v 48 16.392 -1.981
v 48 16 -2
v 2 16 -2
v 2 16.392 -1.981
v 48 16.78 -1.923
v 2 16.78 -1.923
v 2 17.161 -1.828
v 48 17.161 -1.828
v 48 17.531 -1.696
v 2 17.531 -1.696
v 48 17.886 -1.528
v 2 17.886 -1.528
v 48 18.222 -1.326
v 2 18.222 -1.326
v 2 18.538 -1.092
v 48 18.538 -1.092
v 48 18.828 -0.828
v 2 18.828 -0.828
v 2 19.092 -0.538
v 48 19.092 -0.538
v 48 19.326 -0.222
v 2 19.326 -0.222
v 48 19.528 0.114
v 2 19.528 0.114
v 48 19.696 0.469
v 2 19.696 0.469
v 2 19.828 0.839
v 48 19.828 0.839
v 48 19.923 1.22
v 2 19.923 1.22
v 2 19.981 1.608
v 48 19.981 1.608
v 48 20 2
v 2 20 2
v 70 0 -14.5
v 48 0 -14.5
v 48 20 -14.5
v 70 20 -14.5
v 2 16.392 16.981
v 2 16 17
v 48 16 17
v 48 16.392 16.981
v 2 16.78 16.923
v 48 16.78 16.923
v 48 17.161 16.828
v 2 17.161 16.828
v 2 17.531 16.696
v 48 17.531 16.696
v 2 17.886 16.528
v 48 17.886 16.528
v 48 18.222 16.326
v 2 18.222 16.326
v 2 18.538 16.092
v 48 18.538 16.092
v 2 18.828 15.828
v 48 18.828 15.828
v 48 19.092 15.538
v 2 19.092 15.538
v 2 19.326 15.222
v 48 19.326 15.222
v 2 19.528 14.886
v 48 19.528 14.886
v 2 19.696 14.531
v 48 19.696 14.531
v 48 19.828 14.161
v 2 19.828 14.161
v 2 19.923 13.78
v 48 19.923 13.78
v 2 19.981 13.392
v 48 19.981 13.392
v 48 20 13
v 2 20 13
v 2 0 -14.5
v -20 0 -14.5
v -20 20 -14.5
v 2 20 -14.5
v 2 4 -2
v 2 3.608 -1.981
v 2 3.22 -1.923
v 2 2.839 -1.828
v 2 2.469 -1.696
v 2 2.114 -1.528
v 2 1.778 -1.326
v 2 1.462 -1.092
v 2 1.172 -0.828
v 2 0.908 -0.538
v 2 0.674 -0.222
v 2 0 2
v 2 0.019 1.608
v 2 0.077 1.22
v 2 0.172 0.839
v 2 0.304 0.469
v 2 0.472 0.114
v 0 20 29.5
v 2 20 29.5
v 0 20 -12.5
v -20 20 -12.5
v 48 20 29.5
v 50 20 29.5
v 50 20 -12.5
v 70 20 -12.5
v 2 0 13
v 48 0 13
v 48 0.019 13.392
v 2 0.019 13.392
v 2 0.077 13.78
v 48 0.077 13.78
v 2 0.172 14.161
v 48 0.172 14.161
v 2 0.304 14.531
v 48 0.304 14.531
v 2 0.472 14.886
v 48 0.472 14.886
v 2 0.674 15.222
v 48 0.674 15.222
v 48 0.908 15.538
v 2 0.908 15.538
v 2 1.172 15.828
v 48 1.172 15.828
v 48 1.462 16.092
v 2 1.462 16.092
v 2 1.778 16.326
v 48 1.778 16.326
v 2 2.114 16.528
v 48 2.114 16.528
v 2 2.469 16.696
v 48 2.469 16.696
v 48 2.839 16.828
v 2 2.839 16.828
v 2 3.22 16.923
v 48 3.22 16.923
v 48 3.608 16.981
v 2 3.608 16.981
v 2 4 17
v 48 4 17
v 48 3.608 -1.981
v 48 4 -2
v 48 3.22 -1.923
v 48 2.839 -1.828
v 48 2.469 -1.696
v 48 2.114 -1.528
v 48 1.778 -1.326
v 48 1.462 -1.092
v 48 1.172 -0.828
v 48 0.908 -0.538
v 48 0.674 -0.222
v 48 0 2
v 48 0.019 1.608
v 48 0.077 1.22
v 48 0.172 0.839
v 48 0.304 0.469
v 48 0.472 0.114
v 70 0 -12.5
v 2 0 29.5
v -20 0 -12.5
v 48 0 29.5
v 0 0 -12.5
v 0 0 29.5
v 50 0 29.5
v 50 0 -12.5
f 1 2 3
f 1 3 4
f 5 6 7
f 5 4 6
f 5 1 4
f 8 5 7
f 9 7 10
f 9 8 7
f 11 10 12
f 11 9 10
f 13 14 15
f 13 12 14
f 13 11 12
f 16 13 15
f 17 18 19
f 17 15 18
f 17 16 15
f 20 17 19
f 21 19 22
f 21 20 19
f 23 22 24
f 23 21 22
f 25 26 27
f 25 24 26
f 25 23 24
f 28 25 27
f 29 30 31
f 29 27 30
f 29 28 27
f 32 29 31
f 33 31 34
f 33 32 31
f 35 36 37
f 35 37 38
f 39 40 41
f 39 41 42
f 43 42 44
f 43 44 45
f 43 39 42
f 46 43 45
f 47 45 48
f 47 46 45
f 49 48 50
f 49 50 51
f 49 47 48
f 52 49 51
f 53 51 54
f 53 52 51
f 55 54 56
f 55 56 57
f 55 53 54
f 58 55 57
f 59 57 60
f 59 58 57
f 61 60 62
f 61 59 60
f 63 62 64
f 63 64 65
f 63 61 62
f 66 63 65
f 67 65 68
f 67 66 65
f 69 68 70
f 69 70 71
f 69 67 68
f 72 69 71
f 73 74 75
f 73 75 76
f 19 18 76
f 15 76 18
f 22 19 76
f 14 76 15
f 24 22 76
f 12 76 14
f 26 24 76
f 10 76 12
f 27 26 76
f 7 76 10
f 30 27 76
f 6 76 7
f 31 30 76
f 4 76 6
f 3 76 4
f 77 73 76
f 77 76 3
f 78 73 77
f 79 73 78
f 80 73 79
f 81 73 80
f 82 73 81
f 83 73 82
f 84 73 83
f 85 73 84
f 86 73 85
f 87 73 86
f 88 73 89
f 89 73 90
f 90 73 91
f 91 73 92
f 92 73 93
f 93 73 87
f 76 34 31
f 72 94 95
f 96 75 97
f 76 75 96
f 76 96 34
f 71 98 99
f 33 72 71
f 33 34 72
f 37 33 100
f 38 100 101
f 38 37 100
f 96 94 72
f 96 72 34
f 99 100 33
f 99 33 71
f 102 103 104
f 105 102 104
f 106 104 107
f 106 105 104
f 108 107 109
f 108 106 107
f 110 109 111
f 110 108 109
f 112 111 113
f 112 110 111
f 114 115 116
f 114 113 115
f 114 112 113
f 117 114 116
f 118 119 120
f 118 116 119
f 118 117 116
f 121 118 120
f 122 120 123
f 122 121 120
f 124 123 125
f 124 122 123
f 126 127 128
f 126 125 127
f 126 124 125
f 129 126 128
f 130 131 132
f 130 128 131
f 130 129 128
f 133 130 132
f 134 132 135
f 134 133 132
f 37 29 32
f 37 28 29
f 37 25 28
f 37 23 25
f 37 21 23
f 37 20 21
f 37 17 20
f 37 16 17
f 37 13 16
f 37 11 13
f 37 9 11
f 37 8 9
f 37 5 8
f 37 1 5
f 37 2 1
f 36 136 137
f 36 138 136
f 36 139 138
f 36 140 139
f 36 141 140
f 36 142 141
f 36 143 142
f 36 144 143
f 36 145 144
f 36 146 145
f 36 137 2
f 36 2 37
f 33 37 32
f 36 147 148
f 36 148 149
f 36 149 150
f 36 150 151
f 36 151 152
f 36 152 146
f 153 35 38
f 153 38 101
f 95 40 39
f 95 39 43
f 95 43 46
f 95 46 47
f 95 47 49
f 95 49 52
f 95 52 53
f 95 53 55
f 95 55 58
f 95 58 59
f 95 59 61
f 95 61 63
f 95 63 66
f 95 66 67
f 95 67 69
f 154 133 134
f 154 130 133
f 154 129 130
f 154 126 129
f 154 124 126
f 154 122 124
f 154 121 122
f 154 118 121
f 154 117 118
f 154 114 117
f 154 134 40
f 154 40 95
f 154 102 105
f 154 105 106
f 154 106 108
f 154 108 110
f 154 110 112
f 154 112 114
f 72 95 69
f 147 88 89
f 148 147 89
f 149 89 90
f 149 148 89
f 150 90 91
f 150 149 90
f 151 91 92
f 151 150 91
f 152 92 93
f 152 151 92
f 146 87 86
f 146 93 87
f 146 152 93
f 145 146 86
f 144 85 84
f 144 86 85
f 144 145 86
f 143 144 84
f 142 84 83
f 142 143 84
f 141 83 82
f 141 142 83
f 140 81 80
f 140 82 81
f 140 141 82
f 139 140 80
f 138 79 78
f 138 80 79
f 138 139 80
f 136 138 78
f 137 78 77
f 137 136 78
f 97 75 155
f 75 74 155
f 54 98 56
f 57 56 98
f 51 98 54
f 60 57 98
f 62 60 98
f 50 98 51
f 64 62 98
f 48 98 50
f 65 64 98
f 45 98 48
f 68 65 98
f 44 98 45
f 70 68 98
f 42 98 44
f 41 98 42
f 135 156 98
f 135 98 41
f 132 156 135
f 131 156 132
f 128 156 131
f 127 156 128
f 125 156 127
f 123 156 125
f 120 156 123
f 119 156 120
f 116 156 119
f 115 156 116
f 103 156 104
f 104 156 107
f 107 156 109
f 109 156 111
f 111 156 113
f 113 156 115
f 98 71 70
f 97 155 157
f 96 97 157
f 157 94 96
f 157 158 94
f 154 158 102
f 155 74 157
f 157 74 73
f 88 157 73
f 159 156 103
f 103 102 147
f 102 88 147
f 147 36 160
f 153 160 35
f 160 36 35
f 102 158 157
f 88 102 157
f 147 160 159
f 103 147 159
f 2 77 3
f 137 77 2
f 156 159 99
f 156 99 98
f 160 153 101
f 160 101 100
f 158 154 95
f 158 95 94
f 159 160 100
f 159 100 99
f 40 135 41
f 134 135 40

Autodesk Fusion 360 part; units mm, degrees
sketch "Sketch1" plane through (0, 0, 0) normal (0, 1, 0) x (1, 0, 0)
  line L0 (50, 0) -> (50, -15)
  line L1 (0, -15) -> (0, 0)
  line L2 (50, -15) -> (50, -27.5)
  line L3 (50, -27.5) -> (70, -27.5)
  line L4 (70, -27.5) -> (70, -29.5)
  line L5 (70, -29.5) -> (50, -29.5)
  line L6 (50, -29.5) -> (48, -29.5)
  line L7 (48, -29.5) -> (48, -17)
  line L8 (48, -17) -> (2, -17)
  line L9 (2, -17) -> (2, -29.5)
  line L10 (2, -29.5) -> (-20, -29.5)
  line L11 (-20, 14.5) -> (2, 14.5)
  line L12 (2, 14.5) -> (2, 2)
  line L13 (2, 2) -> (48, 2)
  line L14 (48, 2) -> (48, 14.5)
  line L15 (48, 14.5) -> (70, 14.5)
  line L16 (70, 14.5) -> (70, 12.5)
  line L17 (70, 12.5) -> (50, 12.5)
  line L18 (50, 12.5) -> (50, 0)
  line L19 (-20, 14.5) -> (-20, 12.5)
  line L20 (-20, 12.5) -> (0, 12.5)
  line L21 (0, 12.5) -> (0, 0)
  line L22 (-20, -29.5) -> (-20, -27.5)
  line L23 (-20, -27.5) -> (0, -27.5)
  line L24 (0, -27.5) -> (0, -15)
  dimension "d1" = 50
  dimension "d2" = 15
  dimension "d3" = 12.5
  dimension "d4" = 20
  dimension "d5" = 2
  dimension "d6" = 20
  dimension "d7" = 2
  dimension "d8" = 12.5
  dimension "d9" = 46
  dimension "d10" = 12.5
  dimension "d11" = 22
  dimension "d12" = 44
  dimension "d13" = 22
  dimension "d14" = 12.5
  dimension "d15" = 46
  dimension "d16" = 12.5
  dimension "d17" = 22
  dimension "d18" = 2
  dimension "d19" = 20
  dimension "d20" = 2
  dimension "d21" = 20
  dimension "d23" = 2
extrude "Extrude1" add sketch "Sketch1" along normal blind 20
fillet "Fillet1" radius 4 1 edges at (25, 20, 17)
fillet "Fillet2" radius 4 1 edges at (25, 0, 17)
fillet "Fillet3" radius 4 1 edges at (25, 20, -2)
fillet "Fillet4" radius 4 1 edges at (25, 0, -2)
sketch "Sketch2" plane through (50, 0, 0) normal (1, 0, 0) x (0, 0, -1)
  line L0 (-27.5, 0) -> (12.5, 0)
  line L1 (12.5, 0) -> (12.5, 20)
  line L2 (12.5, 20) -> (-27.5, 20)
  line L3 (-27.5, 20) -> (-27.5, 0)
extrude "Extrude2" cut 1 faces at (70, 6.6667, 28.1667) along direction (-1, 0, 0) blind 20
extrude "Extrude3" cut 1 faces at (-20, 6.6667, 28.8333) along direction (1, 0, 0) blind 20
